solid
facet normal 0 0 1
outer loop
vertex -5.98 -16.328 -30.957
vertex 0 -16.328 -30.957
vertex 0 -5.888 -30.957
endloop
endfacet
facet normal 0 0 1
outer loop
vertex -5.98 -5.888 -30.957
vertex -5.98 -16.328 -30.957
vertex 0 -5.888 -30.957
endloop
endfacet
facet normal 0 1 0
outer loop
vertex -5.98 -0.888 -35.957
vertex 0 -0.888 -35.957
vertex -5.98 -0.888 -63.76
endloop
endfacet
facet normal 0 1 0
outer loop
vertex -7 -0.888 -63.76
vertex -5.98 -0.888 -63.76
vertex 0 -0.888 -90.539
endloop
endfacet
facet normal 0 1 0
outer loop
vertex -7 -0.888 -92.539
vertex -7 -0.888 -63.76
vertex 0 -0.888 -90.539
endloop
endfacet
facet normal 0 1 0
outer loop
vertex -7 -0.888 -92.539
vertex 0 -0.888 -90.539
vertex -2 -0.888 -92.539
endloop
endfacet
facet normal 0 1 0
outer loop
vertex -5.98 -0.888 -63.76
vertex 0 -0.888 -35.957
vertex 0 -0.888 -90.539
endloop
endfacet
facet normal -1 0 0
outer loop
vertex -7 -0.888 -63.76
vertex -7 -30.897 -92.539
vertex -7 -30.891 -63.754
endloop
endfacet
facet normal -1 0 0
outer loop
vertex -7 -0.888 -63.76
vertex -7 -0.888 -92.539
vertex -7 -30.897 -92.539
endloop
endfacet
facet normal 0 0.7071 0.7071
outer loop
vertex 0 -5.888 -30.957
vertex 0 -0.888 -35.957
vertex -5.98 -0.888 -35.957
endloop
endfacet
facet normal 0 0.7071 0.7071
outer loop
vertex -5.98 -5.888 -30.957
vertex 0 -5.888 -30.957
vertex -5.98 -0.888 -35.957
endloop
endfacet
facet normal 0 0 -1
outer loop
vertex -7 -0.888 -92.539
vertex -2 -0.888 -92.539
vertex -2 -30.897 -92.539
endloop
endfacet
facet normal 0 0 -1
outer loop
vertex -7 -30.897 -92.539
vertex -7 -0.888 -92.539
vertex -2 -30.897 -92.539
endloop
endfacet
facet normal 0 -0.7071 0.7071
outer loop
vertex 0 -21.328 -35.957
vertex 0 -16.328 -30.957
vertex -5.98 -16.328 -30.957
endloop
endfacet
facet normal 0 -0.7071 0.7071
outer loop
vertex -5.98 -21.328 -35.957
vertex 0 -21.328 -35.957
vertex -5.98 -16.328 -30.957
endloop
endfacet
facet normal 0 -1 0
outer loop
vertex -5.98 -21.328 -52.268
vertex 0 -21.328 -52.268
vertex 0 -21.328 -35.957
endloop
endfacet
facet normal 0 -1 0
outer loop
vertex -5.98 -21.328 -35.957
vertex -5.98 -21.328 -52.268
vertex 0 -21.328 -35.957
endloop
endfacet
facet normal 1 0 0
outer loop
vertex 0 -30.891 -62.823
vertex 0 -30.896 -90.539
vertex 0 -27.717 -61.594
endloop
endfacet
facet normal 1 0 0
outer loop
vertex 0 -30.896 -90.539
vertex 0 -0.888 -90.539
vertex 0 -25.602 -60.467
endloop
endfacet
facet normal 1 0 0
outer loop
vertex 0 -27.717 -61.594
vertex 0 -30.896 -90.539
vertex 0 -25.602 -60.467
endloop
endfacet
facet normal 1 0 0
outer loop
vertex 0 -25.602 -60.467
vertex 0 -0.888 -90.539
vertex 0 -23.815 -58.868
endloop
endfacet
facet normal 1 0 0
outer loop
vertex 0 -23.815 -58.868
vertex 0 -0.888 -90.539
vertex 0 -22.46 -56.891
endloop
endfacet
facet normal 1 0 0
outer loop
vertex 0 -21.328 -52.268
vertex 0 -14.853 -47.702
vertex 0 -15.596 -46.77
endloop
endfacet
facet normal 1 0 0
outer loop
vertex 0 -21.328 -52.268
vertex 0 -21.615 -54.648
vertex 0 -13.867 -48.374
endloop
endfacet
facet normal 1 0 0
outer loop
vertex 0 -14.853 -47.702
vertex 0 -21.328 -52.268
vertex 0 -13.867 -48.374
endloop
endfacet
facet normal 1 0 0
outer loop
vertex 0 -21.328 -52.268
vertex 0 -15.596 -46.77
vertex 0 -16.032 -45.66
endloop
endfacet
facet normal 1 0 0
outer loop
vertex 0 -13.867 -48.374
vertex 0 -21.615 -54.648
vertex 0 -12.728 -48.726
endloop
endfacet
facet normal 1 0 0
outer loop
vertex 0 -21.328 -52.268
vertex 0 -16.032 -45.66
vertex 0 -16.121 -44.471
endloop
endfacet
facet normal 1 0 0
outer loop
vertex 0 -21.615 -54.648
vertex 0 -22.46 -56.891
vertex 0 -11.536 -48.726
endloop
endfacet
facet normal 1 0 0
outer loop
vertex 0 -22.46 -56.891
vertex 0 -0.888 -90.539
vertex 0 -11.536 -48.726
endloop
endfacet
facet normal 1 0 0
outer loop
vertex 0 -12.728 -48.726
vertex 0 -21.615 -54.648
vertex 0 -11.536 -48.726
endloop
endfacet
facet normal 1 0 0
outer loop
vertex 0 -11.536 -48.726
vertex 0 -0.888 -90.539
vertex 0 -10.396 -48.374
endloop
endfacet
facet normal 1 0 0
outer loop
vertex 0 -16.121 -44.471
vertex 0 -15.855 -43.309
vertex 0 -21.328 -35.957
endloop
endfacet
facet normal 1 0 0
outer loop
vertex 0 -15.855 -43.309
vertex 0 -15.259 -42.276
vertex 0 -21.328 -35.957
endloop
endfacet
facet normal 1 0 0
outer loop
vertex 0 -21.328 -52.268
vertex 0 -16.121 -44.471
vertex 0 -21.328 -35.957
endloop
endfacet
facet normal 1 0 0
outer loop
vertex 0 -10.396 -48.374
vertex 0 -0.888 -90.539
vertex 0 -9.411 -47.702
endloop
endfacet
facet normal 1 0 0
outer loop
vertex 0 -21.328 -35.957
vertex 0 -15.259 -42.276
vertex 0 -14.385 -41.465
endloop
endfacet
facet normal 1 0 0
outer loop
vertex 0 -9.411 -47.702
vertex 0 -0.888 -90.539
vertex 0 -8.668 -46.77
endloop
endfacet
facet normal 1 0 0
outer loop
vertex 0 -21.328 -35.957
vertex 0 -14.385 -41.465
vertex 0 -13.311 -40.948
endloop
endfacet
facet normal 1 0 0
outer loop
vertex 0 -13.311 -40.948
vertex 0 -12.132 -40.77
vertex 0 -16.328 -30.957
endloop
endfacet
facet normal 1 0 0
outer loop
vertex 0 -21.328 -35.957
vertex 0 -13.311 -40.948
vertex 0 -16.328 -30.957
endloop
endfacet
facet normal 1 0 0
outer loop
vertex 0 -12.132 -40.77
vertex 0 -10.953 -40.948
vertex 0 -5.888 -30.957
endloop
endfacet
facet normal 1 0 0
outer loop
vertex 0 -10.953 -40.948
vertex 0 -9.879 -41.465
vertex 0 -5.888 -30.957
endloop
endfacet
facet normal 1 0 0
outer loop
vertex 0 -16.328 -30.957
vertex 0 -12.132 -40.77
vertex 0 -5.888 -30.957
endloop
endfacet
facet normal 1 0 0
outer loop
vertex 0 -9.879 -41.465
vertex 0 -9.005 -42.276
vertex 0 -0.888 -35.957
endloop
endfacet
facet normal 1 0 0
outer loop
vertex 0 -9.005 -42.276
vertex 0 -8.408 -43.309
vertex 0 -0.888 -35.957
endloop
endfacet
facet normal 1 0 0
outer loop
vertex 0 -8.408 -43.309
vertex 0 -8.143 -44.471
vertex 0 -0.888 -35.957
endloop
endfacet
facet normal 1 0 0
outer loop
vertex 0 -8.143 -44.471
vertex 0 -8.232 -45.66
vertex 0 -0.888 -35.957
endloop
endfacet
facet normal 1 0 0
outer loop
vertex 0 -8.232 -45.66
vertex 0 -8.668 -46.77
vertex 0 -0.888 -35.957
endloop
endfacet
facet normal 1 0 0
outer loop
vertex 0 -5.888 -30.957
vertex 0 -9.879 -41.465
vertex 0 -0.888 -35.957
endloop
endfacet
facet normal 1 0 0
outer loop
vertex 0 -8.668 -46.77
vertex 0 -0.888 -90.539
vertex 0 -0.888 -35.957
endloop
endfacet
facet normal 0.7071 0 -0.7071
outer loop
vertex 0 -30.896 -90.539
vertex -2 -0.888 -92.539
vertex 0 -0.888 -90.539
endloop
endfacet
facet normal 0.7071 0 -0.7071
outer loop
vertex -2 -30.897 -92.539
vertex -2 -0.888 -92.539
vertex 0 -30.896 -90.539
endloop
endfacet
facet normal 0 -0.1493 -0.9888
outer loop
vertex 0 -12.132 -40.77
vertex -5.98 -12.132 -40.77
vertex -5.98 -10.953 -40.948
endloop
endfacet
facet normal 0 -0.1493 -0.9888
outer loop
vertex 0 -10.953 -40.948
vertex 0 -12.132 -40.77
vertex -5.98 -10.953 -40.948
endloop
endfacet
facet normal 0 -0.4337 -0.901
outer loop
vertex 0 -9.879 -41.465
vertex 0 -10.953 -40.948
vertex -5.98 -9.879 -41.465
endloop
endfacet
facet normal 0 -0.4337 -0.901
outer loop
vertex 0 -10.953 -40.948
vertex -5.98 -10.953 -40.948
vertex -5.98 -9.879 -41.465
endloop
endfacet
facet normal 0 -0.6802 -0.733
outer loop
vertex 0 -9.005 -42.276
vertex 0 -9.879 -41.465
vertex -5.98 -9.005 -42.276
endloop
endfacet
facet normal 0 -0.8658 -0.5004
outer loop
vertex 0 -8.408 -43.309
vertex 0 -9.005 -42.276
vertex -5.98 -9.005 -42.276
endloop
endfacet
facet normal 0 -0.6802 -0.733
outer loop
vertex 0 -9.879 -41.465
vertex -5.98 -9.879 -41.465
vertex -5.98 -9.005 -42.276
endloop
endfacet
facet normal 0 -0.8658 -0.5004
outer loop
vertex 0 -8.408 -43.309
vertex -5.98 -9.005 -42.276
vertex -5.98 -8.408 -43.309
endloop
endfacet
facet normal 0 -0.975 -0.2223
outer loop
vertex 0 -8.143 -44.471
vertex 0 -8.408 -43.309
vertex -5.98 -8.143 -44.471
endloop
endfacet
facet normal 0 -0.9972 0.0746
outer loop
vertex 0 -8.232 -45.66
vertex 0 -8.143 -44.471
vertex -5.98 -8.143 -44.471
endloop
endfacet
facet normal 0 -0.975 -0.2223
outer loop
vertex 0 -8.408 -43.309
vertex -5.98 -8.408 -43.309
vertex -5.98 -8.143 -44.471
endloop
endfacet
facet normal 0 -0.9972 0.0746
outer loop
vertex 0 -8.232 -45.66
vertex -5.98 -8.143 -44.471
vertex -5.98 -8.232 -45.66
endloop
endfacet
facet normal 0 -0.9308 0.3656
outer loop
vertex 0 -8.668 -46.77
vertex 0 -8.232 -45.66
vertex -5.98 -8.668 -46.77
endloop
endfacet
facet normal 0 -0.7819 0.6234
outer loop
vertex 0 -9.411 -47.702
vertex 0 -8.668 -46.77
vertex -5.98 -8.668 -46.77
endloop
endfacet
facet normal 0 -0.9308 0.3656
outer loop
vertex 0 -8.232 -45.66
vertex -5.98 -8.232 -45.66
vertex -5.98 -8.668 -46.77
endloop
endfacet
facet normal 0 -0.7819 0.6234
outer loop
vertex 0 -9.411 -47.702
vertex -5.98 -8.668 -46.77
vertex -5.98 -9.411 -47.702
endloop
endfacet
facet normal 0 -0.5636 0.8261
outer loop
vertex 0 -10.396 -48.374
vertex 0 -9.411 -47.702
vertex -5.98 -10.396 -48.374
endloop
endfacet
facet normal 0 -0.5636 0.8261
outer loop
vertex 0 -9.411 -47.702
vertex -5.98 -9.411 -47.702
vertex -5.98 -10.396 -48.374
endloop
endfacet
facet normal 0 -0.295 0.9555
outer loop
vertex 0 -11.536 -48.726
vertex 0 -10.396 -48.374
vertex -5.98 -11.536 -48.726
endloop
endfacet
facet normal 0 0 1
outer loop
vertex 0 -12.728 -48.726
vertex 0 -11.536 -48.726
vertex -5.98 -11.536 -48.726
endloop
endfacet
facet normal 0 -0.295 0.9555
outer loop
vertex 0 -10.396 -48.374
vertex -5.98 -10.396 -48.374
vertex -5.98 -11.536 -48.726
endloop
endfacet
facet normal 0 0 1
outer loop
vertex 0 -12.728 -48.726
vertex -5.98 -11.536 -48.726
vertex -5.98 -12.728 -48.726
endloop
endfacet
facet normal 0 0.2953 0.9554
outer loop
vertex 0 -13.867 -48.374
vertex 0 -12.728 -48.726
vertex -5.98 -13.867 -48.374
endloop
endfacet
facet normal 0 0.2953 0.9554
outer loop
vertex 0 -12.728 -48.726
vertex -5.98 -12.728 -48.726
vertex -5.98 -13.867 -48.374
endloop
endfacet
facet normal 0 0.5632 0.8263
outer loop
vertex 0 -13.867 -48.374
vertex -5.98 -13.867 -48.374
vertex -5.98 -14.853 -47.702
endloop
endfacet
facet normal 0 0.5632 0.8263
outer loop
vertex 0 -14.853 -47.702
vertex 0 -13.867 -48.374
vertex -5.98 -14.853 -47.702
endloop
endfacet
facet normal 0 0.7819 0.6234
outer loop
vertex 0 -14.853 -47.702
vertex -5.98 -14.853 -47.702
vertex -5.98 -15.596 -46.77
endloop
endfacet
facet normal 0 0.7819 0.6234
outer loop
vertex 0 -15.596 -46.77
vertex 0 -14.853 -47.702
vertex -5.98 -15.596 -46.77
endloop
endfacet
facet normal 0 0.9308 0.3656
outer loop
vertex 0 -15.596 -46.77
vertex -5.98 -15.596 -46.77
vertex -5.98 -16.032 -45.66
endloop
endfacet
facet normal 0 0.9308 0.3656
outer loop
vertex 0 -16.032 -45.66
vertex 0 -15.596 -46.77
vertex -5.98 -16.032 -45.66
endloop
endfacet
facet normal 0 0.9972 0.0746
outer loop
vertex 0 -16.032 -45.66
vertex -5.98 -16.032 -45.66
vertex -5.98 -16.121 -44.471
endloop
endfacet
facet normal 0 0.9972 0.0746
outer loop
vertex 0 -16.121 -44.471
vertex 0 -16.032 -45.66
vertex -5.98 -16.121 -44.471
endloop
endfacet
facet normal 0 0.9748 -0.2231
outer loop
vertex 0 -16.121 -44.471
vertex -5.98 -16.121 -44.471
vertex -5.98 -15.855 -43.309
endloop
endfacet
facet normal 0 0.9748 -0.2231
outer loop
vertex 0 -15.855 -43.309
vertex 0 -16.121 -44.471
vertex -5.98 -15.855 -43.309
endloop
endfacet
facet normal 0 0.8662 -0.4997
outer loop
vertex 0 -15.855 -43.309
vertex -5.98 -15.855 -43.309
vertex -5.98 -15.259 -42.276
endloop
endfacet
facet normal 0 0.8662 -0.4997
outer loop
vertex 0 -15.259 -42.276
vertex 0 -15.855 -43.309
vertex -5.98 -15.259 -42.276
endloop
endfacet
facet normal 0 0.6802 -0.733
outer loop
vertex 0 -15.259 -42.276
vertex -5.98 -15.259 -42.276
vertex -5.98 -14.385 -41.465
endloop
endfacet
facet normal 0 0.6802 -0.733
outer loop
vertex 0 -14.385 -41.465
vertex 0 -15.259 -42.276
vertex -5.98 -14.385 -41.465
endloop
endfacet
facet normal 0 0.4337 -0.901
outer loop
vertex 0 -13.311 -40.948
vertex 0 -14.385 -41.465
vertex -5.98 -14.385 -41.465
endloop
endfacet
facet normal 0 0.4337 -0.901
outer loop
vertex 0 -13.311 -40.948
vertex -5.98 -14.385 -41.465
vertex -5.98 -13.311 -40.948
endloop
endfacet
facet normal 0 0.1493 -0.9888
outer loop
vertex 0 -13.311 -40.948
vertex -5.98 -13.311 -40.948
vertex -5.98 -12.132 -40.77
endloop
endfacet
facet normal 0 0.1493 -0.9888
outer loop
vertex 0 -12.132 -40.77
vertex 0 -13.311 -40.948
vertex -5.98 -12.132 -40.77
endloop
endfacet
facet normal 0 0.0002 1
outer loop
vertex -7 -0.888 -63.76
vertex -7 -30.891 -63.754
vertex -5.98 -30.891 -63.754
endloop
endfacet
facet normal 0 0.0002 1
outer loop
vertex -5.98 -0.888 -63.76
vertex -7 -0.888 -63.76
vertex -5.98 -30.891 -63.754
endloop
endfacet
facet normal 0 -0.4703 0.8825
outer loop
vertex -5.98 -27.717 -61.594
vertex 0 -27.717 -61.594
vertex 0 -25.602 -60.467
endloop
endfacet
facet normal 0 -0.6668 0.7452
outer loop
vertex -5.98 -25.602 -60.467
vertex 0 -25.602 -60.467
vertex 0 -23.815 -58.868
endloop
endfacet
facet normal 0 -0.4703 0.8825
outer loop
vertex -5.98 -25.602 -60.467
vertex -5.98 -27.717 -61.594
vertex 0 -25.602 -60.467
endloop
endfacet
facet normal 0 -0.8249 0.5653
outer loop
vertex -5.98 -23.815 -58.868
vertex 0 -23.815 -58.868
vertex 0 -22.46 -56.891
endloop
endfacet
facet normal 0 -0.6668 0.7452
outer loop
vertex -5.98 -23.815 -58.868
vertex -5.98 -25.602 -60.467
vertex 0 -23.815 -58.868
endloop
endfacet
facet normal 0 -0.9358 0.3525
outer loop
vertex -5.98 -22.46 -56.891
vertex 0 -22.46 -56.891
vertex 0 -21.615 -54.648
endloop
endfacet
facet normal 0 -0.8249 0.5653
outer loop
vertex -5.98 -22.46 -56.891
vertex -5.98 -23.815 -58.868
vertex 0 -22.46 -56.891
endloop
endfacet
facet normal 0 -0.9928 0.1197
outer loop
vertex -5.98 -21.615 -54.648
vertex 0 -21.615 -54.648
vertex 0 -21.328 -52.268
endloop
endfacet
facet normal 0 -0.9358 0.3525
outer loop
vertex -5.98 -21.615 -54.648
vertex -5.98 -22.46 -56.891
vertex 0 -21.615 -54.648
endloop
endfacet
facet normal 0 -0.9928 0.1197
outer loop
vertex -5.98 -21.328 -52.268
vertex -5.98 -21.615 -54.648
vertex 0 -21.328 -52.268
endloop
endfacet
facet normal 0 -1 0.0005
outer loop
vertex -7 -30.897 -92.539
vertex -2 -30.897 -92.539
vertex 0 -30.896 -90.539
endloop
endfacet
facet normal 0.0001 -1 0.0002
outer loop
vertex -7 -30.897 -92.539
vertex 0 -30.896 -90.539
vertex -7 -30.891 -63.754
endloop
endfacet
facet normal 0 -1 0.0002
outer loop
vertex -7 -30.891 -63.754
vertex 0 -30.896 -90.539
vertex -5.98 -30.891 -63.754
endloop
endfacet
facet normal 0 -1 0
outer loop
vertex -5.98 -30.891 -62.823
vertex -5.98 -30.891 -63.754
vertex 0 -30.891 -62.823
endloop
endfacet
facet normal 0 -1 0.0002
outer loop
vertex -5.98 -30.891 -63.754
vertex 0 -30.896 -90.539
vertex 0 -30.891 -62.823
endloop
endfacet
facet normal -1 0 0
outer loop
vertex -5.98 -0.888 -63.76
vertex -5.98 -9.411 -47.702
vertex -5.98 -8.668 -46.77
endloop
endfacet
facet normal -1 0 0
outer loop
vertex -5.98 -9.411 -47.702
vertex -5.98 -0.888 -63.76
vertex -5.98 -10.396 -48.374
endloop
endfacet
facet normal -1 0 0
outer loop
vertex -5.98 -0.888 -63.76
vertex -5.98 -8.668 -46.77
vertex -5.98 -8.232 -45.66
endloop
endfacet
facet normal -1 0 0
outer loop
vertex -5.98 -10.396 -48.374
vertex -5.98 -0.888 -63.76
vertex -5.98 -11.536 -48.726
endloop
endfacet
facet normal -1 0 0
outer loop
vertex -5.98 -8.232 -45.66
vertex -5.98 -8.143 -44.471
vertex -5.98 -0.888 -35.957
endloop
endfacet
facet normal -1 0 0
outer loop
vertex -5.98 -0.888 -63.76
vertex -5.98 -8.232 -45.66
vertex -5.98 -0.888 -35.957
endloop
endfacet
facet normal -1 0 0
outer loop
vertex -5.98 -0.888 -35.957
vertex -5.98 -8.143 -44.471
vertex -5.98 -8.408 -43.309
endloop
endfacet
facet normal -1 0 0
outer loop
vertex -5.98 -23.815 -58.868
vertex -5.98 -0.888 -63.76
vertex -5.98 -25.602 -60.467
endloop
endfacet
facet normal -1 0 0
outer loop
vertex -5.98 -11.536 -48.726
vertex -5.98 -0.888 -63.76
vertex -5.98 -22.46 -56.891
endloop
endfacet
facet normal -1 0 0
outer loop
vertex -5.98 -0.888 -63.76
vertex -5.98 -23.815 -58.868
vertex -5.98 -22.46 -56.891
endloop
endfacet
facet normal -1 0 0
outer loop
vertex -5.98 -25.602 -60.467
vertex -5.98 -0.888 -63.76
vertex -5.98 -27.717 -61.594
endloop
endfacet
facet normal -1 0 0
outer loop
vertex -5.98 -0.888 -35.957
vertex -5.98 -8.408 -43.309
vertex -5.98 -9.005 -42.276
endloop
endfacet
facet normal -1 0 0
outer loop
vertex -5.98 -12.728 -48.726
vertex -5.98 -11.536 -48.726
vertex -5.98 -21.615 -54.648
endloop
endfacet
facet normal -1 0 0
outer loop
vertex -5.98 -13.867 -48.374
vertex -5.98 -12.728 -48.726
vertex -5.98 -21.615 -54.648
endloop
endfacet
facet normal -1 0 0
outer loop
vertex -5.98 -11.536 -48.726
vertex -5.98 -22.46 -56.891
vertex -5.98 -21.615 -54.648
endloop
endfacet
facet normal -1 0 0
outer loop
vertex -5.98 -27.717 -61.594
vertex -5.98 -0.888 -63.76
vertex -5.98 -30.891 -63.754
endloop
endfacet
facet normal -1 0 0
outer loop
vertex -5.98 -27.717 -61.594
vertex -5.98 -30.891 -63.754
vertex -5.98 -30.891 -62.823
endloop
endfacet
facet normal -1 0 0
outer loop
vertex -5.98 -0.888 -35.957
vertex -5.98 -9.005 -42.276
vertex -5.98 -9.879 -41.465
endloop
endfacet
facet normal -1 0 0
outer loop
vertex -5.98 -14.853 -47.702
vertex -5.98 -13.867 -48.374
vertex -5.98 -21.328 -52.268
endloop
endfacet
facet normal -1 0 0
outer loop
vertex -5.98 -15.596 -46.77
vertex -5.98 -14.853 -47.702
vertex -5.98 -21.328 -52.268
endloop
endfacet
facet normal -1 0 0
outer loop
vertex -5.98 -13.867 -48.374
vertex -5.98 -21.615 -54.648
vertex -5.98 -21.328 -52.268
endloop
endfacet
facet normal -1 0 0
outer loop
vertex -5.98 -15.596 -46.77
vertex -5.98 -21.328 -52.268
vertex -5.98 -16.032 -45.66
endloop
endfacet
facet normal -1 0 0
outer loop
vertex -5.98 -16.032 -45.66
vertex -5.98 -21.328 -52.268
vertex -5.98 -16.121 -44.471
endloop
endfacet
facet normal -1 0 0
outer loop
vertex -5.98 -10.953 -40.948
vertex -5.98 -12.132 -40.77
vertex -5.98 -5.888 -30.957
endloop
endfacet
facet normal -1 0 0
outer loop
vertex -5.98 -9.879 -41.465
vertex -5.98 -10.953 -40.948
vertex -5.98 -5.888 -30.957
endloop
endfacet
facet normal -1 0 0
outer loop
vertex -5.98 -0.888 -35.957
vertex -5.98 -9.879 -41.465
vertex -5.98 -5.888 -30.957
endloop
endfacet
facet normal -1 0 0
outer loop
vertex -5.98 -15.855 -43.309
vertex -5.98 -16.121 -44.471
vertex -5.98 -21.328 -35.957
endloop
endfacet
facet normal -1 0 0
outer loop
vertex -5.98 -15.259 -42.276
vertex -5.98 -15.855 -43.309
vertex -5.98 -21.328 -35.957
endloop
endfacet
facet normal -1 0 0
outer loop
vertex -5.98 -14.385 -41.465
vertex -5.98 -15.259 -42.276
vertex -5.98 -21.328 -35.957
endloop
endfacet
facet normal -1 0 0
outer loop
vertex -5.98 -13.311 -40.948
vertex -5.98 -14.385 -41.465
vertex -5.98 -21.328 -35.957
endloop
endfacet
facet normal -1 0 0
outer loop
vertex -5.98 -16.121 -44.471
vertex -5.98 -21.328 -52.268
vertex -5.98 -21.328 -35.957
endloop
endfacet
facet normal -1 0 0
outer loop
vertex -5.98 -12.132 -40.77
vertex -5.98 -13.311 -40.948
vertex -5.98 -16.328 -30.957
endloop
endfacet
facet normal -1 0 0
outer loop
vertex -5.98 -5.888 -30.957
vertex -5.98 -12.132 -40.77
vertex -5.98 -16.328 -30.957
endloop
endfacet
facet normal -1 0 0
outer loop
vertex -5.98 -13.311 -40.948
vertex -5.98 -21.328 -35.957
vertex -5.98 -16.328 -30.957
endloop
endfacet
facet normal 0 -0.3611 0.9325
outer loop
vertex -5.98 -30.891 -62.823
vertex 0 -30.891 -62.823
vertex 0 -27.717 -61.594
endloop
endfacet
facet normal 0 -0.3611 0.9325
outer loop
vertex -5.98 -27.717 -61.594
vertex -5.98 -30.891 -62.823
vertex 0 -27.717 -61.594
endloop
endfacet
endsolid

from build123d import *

# Parameters (mm, degrees)
EXTRUDE_1_DEPTH       = 7
FILLET_1_R            = 10
CHAMFER_1_SIZE        = 5
CHAMFER_2_SIZE        = 2
SKETCH_3_R            = 4
CUT_EXTRUDE_2_DEPTH   = 98.811761039
SKETCH_5_W            = 7.308921848
SKETCH_5_H            = 35.296607786
CUT_EXTRUDE_2_2_DEPTH = 98.534926302


with BuildPart() as part:
    # Эскиз1 → Вытянуть1 (new body)
    with BuildSketch(Plane(origin=(0, 0, 0), x_dir=(0, 0, -1), z_dir=(1, 0, 0))):
        Polygon((62.822655934, -30.891323454), (59.120013374, -21.327683482), (30.956731402, -21.327683482), (30.956731402, -0.888409733), (92.539330922, -0.888409733), (92.539330922, -30.896809382), align=None)
    extrude(amount=-EXTRUDE_1_DEPTH)

    # Скругление1
    fillet_1_edges = [part.edges().sort_by_distance(p)[0] for p in [
        (-3.5, -21.327683482, -59.120013374),
    ]]
    fillet(fillet_1_edges, radius=FILLET_1_R)

    # Фаска1
    chamfer_1_edges = [part.edges().sort_by_distance(p)[0] for p in [
        (-3.5, -21.327683482, -30.956731402),
        (-3.5, -0.888409733, -30.956731402),
    ]]
    chamfer(chamfer_1_edges, length=CHAMFER_1_SIZE)

    # Фаска2
    chamfer_2_edges = [part.edges().sort_by_distance(p)[0] for p in [
        (0, -15.892609557, -92.539330922),
    ]]
    chamfer(chamfer_2_edges, length=CHAMFER_2_SIZE)

    # Эскиз3 → Cut-Extrude 2 (cut, through all)
    with BuildSketch(Plane.ZY.offset(7)):
        with Locations((-44.770273228, -12.131888622)):
            Circle(SKETCH_3_R)
    extrude(amount=-CUT_EXTRUDE_2_DEPTH, mode=Mode.SUBTRACT)

    # Эскиз5 → Cut-Extrude 2 2 (cut, through all)
    with BuildSketch(Plane(origin=(0, -30.879724855, 0.005700636), x_dir=(1, 0, 0), z_dir=(0, -0.9999999829599957, 0.0001846077143906597))):
        with Locations((-9.634460924, -46.111441198)):
            Rectangle(SKETCH_5_W, SKETCH_5_H)
    extrude(amount=-CUT_EXTRUDE_2_2_DEPTH, mode=Mode.SUBTRACT)


solid = part.part
